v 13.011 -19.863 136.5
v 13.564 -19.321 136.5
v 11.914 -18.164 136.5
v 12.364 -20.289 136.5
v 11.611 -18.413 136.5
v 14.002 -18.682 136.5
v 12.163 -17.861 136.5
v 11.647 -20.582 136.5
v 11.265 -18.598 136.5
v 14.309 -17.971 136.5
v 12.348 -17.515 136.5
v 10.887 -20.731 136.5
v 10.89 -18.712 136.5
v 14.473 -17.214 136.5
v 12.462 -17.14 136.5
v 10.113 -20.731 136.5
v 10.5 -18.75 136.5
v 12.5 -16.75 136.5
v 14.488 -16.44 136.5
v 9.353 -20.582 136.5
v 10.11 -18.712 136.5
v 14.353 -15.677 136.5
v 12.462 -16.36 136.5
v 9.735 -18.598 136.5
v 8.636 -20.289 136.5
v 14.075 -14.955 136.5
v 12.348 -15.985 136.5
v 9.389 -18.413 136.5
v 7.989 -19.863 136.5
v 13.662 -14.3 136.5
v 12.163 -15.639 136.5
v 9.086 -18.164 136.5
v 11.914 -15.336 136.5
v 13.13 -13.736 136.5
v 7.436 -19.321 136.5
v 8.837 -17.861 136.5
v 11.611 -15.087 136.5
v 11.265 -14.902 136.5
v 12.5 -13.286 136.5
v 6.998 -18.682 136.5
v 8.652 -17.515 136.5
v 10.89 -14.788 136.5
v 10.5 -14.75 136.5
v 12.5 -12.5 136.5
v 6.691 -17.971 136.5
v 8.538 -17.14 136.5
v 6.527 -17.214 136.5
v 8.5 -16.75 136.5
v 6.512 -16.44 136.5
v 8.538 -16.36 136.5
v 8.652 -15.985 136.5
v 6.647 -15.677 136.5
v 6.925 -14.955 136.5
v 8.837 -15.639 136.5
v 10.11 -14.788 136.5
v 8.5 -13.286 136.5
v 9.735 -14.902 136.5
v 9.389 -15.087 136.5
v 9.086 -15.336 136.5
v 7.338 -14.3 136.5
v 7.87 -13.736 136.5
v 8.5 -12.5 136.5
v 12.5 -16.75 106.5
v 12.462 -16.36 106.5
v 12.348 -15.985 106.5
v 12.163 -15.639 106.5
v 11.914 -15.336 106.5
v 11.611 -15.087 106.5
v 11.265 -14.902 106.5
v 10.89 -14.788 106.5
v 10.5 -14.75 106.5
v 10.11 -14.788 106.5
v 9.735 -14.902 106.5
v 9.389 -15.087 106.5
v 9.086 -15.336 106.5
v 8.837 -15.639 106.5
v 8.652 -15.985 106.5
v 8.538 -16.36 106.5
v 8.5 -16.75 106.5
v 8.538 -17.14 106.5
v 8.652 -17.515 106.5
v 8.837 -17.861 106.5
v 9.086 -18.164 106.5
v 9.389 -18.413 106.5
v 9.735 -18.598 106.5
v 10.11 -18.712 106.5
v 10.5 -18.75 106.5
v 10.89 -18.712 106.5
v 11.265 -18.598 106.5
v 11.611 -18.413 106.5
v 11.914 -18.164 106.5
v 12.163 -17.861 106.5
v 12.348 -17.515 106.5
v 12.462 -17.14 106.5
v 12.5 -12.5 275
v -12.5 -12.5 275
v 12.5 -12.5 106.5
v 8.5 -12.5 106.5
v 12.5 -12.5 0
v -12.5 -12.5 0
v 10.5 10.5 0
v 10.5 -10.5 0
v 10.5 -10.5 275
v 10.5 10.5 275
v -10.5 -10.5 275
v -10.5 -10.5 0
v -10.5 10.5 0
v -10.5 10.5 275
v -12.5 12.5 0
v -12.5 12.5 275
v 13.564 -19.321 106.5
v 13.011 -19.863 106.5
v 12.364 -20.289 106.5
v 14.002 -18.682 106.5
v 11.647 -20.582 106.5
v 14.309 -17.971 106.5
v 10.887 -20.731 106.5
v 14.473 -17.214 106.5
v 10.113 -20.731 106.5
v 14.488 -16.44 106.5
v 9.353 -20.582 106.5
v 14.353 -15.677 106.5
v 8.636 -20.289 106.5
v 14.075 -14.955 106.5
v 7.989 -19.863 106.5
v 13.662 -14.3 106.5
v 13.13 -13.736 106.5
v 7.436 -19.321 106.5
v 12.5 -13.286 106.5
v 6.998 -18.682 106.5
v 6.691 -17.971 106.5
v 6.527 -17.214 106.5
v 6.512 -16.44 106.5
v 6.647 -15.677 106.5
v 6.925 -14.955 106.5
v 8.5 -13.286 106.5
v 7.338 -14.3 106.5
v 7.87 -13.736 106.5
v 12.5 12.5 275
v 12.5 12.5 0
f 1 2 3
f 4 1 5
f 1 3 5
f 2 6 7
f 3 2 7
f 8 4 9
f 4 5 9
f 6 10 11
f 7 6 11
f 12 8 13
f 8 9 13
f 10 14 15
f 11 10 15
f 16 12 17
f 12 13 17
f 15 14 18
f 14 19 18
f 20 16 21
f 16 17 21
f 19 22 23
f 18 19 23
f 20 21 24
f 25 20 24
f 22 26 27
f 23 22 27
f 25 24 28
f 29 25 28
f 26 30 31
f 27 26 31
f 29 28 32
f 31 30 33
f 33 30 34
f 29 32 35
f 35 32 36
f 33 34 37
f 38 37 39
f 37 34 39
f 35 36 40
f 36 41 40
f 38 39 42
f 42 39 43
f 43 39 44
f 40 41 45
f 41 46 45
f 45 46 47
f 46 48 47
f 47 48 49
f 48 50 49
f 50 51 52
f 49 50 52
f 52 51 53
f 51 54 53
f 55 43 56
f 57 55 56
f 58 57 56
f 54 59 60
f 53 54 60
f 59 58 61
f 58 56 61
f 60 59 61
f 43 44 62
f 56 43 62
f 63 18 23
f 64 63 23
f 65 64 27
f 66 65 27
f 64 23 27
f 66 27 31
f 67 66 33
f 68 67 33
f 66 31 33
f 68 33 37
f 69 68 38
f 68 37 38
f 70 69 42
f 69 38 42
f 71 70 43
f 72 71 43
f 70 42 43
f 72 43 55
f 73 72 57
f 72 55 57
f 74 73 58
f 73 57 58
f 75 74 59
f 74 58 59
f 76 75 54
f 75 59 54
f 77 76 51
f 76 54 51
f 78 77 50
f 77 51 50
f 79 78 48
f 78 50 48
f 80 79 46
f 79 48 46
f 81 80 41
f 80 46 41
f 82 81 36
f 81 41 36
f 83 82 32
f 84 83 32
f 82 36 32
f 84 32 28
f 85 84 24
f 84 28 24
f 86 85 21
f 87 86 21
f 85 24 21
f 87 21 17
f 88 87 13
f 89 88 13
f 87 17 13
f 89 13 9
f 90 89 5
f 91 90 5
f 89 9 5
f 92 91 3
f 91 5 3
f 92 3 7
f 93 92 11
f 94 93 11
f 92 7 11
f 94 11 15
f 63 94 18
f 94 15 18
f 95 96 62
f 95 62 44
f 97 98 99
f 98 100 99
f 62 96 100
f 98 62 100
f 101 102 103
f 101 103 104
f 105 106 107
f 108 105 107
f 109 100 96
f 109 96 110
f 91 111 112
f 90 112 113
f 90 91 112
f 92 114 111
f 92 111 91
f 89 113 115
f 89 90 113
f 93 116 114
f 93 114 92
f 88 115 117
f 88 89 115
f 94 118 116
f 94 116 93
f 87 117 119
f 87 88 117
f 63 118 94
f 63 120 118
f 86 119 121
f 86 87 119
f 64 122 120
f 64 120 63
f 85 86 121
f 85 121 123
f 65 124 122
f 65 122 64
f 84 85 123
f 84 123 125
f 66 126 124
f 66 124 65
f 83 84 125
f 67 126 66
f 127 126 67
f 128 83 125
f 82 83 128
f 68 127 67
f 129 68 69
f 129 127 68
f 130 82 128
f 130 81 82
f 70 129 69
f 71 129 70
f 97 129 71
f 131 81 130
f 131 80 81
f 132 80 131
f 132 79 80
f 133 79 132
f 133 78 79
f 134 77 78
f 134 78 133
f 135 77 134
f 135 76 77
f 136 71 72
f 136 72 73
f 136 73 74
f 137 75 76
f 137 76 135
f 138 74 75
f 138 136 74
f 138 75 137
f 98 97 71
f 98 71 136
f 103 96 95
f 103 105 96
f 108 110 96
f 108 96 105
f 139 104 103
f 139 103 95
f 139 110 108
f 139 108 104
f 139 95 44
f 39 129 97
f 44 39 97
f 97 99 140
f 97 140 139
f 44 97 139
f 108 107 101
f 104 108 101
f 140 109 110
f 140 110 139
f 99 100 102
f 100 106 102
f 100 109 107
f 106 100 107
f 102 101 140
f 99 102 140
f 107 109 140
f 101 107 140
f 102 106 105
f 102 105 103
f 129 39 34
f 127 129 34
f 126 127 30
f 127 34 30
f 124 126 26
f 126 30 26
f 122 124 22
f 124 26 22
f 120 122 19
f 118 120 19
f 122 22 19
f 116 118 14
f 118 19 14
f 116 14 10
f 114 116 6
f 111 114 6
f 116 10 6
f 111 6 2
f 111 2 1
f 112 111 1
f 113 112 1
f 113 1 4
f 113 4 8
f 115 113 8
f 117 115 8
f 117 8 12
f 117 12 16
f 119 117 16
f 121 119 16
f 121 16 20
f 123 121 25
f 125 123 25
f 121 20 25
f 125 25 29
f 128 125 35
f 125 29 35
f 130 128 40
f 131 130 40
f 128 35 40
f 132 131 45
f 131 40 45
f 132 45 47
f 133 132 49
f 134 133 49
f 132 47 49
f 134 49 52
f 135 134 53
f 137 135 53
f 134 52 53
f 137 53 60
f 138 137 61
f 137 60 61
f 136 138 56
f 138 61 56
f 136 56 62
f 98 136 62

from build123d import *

# Parameters (mm, degrees)
SKETCH1_W           = 25
SKETCH1_H           = 25
SKETCH1_W_2         = 21
SKETCH1_H_2         = 21
BOSS_EXTRUDE1_DEPTH = 275
SKETCH2_R           = 2
BOSS_EXTRUDE2_DEPTH = 30


with BuildPart() as part:
    # Sketch1 → Boss-Extrude1 (new body)
    with BuildSketch(Plane.XY):
        Rectangle(SKETCH1_W, SKETCH1_H)
        Rectangle(SKETCH1_W_2, SKETCH1_H_2, mode=Mode.SUBTRACT)
    extrude(amount=BOSS_EXTRUDE1_DEPTH)

    # Sketch2 → Boss-Extrude2 (add)
    with BuildSketch(Plane.XY.offset(136.5)):
        with BuildLine():
            Line((12.5, -12.5), (12.5, -13.285898385))
            ThreePointArc((12.5, -13.285898385), (10.5, -20.75), (8.5, -13.285898385))
            Line((8.5, -13.285898385), (8.5, -12.5))
            Line((8.5, -12.5), (12.5, -12.5))
        make_face()
        with Locations((10.5, -16.75)):
            Circle(SKETCH2_R, mode=Mode.SUBTRACT)
    extrude(amount=-BOSS_EXTRUDE2_DEPTH)


solid = part.part
